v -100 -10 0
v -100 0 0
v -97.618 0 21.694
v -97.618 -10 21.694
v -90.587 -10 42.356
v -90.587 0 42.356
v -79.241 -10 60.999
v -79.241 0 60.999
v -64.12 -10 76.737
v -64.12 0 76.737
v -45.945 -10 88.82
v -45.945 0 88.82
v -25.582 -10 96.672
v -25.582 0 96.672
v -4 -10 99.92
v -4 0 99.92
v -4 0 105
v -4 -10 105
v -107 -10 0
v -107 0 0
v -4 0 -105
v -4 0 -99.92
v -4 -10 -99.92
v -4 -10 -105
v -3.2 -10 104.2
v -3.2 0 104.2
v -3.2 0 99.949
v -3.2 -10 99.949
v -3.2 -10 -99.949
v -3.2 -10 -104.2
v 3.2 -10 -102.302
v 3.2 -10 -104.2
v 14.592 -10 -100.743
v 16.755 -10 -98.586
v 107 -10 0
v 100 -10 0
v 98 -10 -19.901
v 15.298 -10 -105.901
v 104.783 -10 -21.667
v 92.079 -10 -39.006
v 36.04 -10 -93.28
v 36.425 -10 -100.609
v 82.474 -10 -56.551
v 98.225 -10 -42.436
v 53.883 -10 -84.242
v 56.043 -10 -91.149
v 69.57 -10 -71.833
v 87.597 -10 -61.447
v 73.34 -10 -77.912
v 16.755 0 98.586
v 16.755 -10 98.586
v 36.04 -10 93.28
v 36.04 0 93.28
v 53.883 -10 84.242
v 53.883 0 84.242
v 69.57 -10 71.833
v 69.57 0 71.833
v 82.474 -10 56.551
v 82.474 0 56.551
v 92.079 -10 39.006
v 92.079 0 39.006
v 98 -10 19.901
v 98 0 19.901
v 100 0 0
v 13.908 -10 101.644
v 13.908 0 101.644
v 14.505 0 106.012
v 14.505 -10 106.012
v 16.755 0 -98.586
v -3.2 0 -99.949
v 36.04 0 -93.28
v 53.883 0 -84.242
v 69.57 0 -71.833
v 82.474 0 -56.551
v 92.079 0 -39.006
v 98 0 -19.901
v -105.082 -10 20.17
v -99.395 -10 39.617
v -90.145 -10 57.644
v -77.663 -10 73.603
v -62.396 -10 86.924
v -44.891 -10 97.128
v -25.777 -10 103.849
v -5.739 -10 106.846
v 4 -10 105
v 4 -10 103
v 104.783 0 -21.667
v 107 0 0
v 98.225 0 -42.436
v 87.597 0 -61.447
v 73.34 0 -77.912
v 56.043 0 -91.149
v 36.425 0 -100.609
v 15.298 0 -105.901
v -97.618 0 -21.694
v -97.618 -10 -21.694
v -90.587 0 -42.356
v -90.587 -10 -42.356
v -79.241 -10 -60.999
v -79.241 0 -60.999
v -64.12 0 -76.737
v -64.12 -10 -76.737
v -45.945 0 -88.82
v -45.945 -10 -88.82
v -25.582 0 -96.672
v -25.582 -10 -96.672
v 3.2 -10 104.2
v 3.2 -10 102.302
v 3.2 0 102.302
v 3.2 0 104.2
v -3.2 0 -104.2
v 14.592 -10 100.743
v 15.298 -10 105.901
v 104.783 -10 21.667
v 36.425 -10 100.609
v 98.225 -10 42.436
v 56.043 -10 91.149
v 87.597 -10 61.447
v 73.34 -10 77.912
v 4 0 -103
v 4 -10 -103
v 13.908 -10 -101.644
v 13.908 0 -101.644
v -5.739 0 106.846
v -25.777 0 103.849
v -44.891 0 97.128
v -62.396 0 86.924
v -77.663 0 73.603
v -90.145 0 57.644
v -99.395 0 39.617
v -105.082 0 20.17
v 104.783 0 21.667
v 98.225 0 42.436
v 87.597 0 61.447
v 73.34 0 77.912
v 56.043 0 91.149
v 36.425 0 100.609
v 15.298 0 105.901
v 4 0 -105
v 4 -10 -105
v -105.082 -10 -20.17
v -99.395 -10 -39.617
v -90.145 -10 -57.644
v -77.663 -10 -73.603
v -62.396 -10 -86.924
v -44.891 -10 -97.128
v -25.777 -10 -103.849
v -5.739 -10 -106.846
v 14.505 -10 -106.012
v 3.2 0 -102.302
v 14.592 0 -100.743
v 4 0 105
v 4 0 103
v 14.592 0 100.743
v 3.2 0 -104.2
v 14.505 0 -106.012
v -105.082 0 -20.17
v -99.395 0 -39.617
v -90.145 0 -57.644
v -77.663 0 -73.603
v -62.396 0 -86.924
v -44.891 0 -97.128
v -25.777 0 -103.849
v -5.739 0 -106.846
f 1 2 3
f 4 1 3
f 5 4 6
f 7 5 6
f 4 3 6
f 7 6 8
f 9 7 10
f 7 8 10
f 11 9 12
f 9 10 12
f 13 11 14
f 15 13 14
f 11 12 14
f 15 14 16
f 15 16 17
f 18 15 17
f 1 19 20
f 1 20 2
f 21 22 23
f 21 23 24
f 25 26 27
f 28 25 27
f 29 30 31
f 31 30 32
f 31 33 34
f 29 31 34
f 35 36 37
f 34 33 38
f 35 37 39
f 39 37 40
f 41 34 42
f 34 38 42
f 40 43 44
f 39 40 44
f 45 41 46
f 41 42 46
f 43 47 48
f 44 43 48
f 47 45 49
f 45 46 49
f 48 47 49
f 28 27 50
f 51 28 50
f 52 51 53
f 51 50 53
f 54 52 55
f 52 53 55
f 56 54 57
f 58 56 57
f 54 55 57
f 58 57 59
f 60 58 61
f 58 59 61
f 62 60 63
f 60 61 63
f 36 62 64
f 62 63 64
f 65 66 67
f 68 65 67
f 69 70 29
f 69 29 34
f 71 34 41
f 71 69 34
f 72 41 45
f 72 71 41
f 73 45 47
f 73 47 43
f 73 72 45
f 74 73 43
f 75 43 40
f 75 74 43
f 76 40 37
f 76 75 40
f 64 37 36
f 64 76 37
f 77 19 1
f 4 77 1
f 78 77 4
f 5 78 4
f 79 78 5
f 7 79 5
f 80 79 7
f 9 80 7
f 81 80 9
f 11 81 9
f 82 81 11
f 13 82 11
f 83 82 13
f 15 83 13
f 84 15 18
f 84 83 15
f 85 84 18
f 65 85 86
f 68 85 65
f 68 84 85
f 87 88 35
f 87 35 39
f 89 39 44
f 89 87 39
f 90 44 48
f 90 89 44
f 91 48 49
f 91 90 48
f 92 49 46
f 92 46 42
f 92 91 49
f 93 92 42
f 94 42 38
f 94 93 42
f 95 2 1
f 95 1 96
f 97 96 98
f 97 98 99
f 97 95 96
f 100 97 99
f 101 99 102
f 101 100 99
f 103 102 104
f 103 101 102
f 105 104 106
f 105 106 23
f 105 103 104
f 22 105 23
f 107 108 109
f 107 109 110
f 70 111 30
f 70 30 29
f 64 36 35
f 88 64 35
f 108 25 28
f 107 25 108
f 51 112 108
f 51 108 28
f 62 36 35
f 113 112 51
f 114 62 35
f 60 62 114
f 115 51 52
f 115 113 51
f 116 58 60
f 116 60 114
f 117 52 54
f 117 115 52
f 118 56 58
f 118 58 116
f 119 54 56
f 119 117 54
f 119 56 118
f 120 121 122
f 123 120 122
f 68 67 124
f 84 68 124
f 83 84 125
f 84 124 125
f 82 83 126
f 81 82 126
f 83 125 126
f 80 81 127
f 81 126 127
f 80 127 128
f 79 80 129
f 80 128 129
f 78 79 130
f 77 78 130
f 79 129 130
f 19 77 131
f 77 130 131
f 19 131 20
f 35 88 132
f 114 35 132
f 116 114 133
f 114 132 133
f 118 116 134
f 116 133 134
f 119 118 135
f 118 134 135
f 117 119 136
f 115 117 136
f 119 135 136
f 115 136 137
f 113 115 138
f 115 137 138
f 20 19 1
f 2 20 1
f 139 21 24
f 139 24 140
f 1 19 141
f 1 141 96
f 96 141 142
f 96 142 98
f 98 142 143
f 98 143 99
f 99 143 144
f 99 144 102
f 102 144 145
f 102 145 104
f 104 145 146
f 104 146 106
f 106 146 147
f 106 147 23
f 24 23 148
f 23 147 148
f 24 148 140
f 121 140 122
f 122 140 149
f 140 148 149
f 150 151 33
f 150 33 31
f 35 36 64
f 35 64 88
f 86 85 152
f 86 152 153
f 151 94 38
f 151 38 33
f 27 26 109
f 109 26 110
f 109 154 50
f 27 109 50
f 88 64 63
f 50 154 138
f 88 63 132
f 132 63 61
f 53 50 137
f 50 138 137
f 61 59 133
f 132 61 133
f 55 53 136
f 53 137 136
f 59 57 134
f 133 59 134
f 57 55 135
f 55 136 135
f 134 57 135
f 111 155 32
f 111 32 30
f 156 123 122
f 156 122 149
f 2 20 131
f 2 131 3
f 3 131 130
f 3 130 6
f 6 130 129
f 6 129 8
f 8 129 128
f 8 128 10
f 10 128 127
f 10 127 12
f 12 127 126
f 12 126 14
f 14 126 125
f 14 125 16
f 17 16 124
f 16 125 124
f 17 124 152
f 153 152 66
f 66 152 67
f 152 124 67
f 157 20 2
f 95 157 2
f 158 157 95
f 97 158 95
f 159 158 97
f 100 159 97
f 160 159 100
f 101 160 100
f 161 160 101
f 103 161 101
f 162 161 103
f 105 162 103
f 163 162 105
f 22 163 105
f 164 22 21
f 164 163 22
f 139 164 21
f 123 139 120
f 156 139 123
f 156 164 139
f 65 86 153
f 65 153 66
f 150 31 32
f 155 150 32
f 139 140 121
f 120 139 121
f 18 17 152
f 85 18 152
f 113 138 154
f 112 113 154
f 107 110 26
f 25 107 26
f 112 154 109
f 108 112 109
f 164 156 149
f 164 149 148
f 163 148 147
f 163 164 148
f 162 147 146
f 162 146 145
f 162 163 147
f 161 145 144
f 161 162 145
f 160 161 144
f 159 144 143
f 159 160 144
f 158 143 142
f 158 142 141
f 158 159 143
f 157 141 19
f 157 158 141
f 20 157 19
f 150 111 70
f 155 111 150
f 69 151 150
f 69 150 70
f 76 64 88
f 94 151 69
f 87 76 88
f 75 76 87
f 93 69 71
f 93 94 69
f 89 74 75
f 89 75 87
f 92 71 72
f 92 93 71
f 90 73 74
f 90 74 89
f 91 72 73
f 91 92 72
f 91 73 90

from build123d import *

# Parameters (mm, degrees)
F2_DEPTH = 10
F4_DEPTH = 10


with BuildPart() as f2:
    # F0 (on Front) → F2 (new body)
    with BuildSketch(Plane.XZ):
        with BuildLine():
            Line((4, 105), (4, 103))
            Line((4, 103), (13.907686, 101.644362))
            Line((13.907686, 101.644362), (14.50533, 106.012242))
            ThreePointArc((14.50533, 106.012242), (-70.345326, 80.625896), (-107, 0))
            Line((-107, 0), (-100, 0))
            ThreePointArc((-100, 0), (-72.111026, 69.282032), (-4, 99.919968))
            Line((-4, 99.919968), (-4, 105))
            Line((-4, 105), (4, 105))
        make_face()
    extrude(amount=F2_DEPTH)


with BuildPart() as f3_1:
    # F3: instance of F2
    add(f2.part.mirror(Plane.XY))


with BuildPart() as f4:
    # F1 (on Front) → F4 (new body)
    with BuildSketch(Plane.XZ):
        with BuildLine():
            ThreePointArc((-3.2, 99.948787), (69.570108, 71.83314), (100, 0))
            Line((100, 0), (107, 0))
            ThreePointArc((107, 0), (80.888308, 70.043427), (15.297539, 105.900828))
            Line((15.297539, 105.900828), (14.59185, 100.743296))
            Line((14.59185, 100.743296), (3.2, 102.302008))
            Line((3.2, 102.302008), (3.2, 104.2))
            Line((3.2, 104.2), (-3.2, 104.2))
            Line((-3.2, 104.2), (-3.2, 99.948787))
        make_face()
    extrude(amount=F4_DEPTH)


with BuildPart() as f5_1:
    # F5: instance of F4
    add(f4.part.mirror(Plane.XY))


solid = Compound([f2.part, f3_1.part, f4.part, f5_1.part])
